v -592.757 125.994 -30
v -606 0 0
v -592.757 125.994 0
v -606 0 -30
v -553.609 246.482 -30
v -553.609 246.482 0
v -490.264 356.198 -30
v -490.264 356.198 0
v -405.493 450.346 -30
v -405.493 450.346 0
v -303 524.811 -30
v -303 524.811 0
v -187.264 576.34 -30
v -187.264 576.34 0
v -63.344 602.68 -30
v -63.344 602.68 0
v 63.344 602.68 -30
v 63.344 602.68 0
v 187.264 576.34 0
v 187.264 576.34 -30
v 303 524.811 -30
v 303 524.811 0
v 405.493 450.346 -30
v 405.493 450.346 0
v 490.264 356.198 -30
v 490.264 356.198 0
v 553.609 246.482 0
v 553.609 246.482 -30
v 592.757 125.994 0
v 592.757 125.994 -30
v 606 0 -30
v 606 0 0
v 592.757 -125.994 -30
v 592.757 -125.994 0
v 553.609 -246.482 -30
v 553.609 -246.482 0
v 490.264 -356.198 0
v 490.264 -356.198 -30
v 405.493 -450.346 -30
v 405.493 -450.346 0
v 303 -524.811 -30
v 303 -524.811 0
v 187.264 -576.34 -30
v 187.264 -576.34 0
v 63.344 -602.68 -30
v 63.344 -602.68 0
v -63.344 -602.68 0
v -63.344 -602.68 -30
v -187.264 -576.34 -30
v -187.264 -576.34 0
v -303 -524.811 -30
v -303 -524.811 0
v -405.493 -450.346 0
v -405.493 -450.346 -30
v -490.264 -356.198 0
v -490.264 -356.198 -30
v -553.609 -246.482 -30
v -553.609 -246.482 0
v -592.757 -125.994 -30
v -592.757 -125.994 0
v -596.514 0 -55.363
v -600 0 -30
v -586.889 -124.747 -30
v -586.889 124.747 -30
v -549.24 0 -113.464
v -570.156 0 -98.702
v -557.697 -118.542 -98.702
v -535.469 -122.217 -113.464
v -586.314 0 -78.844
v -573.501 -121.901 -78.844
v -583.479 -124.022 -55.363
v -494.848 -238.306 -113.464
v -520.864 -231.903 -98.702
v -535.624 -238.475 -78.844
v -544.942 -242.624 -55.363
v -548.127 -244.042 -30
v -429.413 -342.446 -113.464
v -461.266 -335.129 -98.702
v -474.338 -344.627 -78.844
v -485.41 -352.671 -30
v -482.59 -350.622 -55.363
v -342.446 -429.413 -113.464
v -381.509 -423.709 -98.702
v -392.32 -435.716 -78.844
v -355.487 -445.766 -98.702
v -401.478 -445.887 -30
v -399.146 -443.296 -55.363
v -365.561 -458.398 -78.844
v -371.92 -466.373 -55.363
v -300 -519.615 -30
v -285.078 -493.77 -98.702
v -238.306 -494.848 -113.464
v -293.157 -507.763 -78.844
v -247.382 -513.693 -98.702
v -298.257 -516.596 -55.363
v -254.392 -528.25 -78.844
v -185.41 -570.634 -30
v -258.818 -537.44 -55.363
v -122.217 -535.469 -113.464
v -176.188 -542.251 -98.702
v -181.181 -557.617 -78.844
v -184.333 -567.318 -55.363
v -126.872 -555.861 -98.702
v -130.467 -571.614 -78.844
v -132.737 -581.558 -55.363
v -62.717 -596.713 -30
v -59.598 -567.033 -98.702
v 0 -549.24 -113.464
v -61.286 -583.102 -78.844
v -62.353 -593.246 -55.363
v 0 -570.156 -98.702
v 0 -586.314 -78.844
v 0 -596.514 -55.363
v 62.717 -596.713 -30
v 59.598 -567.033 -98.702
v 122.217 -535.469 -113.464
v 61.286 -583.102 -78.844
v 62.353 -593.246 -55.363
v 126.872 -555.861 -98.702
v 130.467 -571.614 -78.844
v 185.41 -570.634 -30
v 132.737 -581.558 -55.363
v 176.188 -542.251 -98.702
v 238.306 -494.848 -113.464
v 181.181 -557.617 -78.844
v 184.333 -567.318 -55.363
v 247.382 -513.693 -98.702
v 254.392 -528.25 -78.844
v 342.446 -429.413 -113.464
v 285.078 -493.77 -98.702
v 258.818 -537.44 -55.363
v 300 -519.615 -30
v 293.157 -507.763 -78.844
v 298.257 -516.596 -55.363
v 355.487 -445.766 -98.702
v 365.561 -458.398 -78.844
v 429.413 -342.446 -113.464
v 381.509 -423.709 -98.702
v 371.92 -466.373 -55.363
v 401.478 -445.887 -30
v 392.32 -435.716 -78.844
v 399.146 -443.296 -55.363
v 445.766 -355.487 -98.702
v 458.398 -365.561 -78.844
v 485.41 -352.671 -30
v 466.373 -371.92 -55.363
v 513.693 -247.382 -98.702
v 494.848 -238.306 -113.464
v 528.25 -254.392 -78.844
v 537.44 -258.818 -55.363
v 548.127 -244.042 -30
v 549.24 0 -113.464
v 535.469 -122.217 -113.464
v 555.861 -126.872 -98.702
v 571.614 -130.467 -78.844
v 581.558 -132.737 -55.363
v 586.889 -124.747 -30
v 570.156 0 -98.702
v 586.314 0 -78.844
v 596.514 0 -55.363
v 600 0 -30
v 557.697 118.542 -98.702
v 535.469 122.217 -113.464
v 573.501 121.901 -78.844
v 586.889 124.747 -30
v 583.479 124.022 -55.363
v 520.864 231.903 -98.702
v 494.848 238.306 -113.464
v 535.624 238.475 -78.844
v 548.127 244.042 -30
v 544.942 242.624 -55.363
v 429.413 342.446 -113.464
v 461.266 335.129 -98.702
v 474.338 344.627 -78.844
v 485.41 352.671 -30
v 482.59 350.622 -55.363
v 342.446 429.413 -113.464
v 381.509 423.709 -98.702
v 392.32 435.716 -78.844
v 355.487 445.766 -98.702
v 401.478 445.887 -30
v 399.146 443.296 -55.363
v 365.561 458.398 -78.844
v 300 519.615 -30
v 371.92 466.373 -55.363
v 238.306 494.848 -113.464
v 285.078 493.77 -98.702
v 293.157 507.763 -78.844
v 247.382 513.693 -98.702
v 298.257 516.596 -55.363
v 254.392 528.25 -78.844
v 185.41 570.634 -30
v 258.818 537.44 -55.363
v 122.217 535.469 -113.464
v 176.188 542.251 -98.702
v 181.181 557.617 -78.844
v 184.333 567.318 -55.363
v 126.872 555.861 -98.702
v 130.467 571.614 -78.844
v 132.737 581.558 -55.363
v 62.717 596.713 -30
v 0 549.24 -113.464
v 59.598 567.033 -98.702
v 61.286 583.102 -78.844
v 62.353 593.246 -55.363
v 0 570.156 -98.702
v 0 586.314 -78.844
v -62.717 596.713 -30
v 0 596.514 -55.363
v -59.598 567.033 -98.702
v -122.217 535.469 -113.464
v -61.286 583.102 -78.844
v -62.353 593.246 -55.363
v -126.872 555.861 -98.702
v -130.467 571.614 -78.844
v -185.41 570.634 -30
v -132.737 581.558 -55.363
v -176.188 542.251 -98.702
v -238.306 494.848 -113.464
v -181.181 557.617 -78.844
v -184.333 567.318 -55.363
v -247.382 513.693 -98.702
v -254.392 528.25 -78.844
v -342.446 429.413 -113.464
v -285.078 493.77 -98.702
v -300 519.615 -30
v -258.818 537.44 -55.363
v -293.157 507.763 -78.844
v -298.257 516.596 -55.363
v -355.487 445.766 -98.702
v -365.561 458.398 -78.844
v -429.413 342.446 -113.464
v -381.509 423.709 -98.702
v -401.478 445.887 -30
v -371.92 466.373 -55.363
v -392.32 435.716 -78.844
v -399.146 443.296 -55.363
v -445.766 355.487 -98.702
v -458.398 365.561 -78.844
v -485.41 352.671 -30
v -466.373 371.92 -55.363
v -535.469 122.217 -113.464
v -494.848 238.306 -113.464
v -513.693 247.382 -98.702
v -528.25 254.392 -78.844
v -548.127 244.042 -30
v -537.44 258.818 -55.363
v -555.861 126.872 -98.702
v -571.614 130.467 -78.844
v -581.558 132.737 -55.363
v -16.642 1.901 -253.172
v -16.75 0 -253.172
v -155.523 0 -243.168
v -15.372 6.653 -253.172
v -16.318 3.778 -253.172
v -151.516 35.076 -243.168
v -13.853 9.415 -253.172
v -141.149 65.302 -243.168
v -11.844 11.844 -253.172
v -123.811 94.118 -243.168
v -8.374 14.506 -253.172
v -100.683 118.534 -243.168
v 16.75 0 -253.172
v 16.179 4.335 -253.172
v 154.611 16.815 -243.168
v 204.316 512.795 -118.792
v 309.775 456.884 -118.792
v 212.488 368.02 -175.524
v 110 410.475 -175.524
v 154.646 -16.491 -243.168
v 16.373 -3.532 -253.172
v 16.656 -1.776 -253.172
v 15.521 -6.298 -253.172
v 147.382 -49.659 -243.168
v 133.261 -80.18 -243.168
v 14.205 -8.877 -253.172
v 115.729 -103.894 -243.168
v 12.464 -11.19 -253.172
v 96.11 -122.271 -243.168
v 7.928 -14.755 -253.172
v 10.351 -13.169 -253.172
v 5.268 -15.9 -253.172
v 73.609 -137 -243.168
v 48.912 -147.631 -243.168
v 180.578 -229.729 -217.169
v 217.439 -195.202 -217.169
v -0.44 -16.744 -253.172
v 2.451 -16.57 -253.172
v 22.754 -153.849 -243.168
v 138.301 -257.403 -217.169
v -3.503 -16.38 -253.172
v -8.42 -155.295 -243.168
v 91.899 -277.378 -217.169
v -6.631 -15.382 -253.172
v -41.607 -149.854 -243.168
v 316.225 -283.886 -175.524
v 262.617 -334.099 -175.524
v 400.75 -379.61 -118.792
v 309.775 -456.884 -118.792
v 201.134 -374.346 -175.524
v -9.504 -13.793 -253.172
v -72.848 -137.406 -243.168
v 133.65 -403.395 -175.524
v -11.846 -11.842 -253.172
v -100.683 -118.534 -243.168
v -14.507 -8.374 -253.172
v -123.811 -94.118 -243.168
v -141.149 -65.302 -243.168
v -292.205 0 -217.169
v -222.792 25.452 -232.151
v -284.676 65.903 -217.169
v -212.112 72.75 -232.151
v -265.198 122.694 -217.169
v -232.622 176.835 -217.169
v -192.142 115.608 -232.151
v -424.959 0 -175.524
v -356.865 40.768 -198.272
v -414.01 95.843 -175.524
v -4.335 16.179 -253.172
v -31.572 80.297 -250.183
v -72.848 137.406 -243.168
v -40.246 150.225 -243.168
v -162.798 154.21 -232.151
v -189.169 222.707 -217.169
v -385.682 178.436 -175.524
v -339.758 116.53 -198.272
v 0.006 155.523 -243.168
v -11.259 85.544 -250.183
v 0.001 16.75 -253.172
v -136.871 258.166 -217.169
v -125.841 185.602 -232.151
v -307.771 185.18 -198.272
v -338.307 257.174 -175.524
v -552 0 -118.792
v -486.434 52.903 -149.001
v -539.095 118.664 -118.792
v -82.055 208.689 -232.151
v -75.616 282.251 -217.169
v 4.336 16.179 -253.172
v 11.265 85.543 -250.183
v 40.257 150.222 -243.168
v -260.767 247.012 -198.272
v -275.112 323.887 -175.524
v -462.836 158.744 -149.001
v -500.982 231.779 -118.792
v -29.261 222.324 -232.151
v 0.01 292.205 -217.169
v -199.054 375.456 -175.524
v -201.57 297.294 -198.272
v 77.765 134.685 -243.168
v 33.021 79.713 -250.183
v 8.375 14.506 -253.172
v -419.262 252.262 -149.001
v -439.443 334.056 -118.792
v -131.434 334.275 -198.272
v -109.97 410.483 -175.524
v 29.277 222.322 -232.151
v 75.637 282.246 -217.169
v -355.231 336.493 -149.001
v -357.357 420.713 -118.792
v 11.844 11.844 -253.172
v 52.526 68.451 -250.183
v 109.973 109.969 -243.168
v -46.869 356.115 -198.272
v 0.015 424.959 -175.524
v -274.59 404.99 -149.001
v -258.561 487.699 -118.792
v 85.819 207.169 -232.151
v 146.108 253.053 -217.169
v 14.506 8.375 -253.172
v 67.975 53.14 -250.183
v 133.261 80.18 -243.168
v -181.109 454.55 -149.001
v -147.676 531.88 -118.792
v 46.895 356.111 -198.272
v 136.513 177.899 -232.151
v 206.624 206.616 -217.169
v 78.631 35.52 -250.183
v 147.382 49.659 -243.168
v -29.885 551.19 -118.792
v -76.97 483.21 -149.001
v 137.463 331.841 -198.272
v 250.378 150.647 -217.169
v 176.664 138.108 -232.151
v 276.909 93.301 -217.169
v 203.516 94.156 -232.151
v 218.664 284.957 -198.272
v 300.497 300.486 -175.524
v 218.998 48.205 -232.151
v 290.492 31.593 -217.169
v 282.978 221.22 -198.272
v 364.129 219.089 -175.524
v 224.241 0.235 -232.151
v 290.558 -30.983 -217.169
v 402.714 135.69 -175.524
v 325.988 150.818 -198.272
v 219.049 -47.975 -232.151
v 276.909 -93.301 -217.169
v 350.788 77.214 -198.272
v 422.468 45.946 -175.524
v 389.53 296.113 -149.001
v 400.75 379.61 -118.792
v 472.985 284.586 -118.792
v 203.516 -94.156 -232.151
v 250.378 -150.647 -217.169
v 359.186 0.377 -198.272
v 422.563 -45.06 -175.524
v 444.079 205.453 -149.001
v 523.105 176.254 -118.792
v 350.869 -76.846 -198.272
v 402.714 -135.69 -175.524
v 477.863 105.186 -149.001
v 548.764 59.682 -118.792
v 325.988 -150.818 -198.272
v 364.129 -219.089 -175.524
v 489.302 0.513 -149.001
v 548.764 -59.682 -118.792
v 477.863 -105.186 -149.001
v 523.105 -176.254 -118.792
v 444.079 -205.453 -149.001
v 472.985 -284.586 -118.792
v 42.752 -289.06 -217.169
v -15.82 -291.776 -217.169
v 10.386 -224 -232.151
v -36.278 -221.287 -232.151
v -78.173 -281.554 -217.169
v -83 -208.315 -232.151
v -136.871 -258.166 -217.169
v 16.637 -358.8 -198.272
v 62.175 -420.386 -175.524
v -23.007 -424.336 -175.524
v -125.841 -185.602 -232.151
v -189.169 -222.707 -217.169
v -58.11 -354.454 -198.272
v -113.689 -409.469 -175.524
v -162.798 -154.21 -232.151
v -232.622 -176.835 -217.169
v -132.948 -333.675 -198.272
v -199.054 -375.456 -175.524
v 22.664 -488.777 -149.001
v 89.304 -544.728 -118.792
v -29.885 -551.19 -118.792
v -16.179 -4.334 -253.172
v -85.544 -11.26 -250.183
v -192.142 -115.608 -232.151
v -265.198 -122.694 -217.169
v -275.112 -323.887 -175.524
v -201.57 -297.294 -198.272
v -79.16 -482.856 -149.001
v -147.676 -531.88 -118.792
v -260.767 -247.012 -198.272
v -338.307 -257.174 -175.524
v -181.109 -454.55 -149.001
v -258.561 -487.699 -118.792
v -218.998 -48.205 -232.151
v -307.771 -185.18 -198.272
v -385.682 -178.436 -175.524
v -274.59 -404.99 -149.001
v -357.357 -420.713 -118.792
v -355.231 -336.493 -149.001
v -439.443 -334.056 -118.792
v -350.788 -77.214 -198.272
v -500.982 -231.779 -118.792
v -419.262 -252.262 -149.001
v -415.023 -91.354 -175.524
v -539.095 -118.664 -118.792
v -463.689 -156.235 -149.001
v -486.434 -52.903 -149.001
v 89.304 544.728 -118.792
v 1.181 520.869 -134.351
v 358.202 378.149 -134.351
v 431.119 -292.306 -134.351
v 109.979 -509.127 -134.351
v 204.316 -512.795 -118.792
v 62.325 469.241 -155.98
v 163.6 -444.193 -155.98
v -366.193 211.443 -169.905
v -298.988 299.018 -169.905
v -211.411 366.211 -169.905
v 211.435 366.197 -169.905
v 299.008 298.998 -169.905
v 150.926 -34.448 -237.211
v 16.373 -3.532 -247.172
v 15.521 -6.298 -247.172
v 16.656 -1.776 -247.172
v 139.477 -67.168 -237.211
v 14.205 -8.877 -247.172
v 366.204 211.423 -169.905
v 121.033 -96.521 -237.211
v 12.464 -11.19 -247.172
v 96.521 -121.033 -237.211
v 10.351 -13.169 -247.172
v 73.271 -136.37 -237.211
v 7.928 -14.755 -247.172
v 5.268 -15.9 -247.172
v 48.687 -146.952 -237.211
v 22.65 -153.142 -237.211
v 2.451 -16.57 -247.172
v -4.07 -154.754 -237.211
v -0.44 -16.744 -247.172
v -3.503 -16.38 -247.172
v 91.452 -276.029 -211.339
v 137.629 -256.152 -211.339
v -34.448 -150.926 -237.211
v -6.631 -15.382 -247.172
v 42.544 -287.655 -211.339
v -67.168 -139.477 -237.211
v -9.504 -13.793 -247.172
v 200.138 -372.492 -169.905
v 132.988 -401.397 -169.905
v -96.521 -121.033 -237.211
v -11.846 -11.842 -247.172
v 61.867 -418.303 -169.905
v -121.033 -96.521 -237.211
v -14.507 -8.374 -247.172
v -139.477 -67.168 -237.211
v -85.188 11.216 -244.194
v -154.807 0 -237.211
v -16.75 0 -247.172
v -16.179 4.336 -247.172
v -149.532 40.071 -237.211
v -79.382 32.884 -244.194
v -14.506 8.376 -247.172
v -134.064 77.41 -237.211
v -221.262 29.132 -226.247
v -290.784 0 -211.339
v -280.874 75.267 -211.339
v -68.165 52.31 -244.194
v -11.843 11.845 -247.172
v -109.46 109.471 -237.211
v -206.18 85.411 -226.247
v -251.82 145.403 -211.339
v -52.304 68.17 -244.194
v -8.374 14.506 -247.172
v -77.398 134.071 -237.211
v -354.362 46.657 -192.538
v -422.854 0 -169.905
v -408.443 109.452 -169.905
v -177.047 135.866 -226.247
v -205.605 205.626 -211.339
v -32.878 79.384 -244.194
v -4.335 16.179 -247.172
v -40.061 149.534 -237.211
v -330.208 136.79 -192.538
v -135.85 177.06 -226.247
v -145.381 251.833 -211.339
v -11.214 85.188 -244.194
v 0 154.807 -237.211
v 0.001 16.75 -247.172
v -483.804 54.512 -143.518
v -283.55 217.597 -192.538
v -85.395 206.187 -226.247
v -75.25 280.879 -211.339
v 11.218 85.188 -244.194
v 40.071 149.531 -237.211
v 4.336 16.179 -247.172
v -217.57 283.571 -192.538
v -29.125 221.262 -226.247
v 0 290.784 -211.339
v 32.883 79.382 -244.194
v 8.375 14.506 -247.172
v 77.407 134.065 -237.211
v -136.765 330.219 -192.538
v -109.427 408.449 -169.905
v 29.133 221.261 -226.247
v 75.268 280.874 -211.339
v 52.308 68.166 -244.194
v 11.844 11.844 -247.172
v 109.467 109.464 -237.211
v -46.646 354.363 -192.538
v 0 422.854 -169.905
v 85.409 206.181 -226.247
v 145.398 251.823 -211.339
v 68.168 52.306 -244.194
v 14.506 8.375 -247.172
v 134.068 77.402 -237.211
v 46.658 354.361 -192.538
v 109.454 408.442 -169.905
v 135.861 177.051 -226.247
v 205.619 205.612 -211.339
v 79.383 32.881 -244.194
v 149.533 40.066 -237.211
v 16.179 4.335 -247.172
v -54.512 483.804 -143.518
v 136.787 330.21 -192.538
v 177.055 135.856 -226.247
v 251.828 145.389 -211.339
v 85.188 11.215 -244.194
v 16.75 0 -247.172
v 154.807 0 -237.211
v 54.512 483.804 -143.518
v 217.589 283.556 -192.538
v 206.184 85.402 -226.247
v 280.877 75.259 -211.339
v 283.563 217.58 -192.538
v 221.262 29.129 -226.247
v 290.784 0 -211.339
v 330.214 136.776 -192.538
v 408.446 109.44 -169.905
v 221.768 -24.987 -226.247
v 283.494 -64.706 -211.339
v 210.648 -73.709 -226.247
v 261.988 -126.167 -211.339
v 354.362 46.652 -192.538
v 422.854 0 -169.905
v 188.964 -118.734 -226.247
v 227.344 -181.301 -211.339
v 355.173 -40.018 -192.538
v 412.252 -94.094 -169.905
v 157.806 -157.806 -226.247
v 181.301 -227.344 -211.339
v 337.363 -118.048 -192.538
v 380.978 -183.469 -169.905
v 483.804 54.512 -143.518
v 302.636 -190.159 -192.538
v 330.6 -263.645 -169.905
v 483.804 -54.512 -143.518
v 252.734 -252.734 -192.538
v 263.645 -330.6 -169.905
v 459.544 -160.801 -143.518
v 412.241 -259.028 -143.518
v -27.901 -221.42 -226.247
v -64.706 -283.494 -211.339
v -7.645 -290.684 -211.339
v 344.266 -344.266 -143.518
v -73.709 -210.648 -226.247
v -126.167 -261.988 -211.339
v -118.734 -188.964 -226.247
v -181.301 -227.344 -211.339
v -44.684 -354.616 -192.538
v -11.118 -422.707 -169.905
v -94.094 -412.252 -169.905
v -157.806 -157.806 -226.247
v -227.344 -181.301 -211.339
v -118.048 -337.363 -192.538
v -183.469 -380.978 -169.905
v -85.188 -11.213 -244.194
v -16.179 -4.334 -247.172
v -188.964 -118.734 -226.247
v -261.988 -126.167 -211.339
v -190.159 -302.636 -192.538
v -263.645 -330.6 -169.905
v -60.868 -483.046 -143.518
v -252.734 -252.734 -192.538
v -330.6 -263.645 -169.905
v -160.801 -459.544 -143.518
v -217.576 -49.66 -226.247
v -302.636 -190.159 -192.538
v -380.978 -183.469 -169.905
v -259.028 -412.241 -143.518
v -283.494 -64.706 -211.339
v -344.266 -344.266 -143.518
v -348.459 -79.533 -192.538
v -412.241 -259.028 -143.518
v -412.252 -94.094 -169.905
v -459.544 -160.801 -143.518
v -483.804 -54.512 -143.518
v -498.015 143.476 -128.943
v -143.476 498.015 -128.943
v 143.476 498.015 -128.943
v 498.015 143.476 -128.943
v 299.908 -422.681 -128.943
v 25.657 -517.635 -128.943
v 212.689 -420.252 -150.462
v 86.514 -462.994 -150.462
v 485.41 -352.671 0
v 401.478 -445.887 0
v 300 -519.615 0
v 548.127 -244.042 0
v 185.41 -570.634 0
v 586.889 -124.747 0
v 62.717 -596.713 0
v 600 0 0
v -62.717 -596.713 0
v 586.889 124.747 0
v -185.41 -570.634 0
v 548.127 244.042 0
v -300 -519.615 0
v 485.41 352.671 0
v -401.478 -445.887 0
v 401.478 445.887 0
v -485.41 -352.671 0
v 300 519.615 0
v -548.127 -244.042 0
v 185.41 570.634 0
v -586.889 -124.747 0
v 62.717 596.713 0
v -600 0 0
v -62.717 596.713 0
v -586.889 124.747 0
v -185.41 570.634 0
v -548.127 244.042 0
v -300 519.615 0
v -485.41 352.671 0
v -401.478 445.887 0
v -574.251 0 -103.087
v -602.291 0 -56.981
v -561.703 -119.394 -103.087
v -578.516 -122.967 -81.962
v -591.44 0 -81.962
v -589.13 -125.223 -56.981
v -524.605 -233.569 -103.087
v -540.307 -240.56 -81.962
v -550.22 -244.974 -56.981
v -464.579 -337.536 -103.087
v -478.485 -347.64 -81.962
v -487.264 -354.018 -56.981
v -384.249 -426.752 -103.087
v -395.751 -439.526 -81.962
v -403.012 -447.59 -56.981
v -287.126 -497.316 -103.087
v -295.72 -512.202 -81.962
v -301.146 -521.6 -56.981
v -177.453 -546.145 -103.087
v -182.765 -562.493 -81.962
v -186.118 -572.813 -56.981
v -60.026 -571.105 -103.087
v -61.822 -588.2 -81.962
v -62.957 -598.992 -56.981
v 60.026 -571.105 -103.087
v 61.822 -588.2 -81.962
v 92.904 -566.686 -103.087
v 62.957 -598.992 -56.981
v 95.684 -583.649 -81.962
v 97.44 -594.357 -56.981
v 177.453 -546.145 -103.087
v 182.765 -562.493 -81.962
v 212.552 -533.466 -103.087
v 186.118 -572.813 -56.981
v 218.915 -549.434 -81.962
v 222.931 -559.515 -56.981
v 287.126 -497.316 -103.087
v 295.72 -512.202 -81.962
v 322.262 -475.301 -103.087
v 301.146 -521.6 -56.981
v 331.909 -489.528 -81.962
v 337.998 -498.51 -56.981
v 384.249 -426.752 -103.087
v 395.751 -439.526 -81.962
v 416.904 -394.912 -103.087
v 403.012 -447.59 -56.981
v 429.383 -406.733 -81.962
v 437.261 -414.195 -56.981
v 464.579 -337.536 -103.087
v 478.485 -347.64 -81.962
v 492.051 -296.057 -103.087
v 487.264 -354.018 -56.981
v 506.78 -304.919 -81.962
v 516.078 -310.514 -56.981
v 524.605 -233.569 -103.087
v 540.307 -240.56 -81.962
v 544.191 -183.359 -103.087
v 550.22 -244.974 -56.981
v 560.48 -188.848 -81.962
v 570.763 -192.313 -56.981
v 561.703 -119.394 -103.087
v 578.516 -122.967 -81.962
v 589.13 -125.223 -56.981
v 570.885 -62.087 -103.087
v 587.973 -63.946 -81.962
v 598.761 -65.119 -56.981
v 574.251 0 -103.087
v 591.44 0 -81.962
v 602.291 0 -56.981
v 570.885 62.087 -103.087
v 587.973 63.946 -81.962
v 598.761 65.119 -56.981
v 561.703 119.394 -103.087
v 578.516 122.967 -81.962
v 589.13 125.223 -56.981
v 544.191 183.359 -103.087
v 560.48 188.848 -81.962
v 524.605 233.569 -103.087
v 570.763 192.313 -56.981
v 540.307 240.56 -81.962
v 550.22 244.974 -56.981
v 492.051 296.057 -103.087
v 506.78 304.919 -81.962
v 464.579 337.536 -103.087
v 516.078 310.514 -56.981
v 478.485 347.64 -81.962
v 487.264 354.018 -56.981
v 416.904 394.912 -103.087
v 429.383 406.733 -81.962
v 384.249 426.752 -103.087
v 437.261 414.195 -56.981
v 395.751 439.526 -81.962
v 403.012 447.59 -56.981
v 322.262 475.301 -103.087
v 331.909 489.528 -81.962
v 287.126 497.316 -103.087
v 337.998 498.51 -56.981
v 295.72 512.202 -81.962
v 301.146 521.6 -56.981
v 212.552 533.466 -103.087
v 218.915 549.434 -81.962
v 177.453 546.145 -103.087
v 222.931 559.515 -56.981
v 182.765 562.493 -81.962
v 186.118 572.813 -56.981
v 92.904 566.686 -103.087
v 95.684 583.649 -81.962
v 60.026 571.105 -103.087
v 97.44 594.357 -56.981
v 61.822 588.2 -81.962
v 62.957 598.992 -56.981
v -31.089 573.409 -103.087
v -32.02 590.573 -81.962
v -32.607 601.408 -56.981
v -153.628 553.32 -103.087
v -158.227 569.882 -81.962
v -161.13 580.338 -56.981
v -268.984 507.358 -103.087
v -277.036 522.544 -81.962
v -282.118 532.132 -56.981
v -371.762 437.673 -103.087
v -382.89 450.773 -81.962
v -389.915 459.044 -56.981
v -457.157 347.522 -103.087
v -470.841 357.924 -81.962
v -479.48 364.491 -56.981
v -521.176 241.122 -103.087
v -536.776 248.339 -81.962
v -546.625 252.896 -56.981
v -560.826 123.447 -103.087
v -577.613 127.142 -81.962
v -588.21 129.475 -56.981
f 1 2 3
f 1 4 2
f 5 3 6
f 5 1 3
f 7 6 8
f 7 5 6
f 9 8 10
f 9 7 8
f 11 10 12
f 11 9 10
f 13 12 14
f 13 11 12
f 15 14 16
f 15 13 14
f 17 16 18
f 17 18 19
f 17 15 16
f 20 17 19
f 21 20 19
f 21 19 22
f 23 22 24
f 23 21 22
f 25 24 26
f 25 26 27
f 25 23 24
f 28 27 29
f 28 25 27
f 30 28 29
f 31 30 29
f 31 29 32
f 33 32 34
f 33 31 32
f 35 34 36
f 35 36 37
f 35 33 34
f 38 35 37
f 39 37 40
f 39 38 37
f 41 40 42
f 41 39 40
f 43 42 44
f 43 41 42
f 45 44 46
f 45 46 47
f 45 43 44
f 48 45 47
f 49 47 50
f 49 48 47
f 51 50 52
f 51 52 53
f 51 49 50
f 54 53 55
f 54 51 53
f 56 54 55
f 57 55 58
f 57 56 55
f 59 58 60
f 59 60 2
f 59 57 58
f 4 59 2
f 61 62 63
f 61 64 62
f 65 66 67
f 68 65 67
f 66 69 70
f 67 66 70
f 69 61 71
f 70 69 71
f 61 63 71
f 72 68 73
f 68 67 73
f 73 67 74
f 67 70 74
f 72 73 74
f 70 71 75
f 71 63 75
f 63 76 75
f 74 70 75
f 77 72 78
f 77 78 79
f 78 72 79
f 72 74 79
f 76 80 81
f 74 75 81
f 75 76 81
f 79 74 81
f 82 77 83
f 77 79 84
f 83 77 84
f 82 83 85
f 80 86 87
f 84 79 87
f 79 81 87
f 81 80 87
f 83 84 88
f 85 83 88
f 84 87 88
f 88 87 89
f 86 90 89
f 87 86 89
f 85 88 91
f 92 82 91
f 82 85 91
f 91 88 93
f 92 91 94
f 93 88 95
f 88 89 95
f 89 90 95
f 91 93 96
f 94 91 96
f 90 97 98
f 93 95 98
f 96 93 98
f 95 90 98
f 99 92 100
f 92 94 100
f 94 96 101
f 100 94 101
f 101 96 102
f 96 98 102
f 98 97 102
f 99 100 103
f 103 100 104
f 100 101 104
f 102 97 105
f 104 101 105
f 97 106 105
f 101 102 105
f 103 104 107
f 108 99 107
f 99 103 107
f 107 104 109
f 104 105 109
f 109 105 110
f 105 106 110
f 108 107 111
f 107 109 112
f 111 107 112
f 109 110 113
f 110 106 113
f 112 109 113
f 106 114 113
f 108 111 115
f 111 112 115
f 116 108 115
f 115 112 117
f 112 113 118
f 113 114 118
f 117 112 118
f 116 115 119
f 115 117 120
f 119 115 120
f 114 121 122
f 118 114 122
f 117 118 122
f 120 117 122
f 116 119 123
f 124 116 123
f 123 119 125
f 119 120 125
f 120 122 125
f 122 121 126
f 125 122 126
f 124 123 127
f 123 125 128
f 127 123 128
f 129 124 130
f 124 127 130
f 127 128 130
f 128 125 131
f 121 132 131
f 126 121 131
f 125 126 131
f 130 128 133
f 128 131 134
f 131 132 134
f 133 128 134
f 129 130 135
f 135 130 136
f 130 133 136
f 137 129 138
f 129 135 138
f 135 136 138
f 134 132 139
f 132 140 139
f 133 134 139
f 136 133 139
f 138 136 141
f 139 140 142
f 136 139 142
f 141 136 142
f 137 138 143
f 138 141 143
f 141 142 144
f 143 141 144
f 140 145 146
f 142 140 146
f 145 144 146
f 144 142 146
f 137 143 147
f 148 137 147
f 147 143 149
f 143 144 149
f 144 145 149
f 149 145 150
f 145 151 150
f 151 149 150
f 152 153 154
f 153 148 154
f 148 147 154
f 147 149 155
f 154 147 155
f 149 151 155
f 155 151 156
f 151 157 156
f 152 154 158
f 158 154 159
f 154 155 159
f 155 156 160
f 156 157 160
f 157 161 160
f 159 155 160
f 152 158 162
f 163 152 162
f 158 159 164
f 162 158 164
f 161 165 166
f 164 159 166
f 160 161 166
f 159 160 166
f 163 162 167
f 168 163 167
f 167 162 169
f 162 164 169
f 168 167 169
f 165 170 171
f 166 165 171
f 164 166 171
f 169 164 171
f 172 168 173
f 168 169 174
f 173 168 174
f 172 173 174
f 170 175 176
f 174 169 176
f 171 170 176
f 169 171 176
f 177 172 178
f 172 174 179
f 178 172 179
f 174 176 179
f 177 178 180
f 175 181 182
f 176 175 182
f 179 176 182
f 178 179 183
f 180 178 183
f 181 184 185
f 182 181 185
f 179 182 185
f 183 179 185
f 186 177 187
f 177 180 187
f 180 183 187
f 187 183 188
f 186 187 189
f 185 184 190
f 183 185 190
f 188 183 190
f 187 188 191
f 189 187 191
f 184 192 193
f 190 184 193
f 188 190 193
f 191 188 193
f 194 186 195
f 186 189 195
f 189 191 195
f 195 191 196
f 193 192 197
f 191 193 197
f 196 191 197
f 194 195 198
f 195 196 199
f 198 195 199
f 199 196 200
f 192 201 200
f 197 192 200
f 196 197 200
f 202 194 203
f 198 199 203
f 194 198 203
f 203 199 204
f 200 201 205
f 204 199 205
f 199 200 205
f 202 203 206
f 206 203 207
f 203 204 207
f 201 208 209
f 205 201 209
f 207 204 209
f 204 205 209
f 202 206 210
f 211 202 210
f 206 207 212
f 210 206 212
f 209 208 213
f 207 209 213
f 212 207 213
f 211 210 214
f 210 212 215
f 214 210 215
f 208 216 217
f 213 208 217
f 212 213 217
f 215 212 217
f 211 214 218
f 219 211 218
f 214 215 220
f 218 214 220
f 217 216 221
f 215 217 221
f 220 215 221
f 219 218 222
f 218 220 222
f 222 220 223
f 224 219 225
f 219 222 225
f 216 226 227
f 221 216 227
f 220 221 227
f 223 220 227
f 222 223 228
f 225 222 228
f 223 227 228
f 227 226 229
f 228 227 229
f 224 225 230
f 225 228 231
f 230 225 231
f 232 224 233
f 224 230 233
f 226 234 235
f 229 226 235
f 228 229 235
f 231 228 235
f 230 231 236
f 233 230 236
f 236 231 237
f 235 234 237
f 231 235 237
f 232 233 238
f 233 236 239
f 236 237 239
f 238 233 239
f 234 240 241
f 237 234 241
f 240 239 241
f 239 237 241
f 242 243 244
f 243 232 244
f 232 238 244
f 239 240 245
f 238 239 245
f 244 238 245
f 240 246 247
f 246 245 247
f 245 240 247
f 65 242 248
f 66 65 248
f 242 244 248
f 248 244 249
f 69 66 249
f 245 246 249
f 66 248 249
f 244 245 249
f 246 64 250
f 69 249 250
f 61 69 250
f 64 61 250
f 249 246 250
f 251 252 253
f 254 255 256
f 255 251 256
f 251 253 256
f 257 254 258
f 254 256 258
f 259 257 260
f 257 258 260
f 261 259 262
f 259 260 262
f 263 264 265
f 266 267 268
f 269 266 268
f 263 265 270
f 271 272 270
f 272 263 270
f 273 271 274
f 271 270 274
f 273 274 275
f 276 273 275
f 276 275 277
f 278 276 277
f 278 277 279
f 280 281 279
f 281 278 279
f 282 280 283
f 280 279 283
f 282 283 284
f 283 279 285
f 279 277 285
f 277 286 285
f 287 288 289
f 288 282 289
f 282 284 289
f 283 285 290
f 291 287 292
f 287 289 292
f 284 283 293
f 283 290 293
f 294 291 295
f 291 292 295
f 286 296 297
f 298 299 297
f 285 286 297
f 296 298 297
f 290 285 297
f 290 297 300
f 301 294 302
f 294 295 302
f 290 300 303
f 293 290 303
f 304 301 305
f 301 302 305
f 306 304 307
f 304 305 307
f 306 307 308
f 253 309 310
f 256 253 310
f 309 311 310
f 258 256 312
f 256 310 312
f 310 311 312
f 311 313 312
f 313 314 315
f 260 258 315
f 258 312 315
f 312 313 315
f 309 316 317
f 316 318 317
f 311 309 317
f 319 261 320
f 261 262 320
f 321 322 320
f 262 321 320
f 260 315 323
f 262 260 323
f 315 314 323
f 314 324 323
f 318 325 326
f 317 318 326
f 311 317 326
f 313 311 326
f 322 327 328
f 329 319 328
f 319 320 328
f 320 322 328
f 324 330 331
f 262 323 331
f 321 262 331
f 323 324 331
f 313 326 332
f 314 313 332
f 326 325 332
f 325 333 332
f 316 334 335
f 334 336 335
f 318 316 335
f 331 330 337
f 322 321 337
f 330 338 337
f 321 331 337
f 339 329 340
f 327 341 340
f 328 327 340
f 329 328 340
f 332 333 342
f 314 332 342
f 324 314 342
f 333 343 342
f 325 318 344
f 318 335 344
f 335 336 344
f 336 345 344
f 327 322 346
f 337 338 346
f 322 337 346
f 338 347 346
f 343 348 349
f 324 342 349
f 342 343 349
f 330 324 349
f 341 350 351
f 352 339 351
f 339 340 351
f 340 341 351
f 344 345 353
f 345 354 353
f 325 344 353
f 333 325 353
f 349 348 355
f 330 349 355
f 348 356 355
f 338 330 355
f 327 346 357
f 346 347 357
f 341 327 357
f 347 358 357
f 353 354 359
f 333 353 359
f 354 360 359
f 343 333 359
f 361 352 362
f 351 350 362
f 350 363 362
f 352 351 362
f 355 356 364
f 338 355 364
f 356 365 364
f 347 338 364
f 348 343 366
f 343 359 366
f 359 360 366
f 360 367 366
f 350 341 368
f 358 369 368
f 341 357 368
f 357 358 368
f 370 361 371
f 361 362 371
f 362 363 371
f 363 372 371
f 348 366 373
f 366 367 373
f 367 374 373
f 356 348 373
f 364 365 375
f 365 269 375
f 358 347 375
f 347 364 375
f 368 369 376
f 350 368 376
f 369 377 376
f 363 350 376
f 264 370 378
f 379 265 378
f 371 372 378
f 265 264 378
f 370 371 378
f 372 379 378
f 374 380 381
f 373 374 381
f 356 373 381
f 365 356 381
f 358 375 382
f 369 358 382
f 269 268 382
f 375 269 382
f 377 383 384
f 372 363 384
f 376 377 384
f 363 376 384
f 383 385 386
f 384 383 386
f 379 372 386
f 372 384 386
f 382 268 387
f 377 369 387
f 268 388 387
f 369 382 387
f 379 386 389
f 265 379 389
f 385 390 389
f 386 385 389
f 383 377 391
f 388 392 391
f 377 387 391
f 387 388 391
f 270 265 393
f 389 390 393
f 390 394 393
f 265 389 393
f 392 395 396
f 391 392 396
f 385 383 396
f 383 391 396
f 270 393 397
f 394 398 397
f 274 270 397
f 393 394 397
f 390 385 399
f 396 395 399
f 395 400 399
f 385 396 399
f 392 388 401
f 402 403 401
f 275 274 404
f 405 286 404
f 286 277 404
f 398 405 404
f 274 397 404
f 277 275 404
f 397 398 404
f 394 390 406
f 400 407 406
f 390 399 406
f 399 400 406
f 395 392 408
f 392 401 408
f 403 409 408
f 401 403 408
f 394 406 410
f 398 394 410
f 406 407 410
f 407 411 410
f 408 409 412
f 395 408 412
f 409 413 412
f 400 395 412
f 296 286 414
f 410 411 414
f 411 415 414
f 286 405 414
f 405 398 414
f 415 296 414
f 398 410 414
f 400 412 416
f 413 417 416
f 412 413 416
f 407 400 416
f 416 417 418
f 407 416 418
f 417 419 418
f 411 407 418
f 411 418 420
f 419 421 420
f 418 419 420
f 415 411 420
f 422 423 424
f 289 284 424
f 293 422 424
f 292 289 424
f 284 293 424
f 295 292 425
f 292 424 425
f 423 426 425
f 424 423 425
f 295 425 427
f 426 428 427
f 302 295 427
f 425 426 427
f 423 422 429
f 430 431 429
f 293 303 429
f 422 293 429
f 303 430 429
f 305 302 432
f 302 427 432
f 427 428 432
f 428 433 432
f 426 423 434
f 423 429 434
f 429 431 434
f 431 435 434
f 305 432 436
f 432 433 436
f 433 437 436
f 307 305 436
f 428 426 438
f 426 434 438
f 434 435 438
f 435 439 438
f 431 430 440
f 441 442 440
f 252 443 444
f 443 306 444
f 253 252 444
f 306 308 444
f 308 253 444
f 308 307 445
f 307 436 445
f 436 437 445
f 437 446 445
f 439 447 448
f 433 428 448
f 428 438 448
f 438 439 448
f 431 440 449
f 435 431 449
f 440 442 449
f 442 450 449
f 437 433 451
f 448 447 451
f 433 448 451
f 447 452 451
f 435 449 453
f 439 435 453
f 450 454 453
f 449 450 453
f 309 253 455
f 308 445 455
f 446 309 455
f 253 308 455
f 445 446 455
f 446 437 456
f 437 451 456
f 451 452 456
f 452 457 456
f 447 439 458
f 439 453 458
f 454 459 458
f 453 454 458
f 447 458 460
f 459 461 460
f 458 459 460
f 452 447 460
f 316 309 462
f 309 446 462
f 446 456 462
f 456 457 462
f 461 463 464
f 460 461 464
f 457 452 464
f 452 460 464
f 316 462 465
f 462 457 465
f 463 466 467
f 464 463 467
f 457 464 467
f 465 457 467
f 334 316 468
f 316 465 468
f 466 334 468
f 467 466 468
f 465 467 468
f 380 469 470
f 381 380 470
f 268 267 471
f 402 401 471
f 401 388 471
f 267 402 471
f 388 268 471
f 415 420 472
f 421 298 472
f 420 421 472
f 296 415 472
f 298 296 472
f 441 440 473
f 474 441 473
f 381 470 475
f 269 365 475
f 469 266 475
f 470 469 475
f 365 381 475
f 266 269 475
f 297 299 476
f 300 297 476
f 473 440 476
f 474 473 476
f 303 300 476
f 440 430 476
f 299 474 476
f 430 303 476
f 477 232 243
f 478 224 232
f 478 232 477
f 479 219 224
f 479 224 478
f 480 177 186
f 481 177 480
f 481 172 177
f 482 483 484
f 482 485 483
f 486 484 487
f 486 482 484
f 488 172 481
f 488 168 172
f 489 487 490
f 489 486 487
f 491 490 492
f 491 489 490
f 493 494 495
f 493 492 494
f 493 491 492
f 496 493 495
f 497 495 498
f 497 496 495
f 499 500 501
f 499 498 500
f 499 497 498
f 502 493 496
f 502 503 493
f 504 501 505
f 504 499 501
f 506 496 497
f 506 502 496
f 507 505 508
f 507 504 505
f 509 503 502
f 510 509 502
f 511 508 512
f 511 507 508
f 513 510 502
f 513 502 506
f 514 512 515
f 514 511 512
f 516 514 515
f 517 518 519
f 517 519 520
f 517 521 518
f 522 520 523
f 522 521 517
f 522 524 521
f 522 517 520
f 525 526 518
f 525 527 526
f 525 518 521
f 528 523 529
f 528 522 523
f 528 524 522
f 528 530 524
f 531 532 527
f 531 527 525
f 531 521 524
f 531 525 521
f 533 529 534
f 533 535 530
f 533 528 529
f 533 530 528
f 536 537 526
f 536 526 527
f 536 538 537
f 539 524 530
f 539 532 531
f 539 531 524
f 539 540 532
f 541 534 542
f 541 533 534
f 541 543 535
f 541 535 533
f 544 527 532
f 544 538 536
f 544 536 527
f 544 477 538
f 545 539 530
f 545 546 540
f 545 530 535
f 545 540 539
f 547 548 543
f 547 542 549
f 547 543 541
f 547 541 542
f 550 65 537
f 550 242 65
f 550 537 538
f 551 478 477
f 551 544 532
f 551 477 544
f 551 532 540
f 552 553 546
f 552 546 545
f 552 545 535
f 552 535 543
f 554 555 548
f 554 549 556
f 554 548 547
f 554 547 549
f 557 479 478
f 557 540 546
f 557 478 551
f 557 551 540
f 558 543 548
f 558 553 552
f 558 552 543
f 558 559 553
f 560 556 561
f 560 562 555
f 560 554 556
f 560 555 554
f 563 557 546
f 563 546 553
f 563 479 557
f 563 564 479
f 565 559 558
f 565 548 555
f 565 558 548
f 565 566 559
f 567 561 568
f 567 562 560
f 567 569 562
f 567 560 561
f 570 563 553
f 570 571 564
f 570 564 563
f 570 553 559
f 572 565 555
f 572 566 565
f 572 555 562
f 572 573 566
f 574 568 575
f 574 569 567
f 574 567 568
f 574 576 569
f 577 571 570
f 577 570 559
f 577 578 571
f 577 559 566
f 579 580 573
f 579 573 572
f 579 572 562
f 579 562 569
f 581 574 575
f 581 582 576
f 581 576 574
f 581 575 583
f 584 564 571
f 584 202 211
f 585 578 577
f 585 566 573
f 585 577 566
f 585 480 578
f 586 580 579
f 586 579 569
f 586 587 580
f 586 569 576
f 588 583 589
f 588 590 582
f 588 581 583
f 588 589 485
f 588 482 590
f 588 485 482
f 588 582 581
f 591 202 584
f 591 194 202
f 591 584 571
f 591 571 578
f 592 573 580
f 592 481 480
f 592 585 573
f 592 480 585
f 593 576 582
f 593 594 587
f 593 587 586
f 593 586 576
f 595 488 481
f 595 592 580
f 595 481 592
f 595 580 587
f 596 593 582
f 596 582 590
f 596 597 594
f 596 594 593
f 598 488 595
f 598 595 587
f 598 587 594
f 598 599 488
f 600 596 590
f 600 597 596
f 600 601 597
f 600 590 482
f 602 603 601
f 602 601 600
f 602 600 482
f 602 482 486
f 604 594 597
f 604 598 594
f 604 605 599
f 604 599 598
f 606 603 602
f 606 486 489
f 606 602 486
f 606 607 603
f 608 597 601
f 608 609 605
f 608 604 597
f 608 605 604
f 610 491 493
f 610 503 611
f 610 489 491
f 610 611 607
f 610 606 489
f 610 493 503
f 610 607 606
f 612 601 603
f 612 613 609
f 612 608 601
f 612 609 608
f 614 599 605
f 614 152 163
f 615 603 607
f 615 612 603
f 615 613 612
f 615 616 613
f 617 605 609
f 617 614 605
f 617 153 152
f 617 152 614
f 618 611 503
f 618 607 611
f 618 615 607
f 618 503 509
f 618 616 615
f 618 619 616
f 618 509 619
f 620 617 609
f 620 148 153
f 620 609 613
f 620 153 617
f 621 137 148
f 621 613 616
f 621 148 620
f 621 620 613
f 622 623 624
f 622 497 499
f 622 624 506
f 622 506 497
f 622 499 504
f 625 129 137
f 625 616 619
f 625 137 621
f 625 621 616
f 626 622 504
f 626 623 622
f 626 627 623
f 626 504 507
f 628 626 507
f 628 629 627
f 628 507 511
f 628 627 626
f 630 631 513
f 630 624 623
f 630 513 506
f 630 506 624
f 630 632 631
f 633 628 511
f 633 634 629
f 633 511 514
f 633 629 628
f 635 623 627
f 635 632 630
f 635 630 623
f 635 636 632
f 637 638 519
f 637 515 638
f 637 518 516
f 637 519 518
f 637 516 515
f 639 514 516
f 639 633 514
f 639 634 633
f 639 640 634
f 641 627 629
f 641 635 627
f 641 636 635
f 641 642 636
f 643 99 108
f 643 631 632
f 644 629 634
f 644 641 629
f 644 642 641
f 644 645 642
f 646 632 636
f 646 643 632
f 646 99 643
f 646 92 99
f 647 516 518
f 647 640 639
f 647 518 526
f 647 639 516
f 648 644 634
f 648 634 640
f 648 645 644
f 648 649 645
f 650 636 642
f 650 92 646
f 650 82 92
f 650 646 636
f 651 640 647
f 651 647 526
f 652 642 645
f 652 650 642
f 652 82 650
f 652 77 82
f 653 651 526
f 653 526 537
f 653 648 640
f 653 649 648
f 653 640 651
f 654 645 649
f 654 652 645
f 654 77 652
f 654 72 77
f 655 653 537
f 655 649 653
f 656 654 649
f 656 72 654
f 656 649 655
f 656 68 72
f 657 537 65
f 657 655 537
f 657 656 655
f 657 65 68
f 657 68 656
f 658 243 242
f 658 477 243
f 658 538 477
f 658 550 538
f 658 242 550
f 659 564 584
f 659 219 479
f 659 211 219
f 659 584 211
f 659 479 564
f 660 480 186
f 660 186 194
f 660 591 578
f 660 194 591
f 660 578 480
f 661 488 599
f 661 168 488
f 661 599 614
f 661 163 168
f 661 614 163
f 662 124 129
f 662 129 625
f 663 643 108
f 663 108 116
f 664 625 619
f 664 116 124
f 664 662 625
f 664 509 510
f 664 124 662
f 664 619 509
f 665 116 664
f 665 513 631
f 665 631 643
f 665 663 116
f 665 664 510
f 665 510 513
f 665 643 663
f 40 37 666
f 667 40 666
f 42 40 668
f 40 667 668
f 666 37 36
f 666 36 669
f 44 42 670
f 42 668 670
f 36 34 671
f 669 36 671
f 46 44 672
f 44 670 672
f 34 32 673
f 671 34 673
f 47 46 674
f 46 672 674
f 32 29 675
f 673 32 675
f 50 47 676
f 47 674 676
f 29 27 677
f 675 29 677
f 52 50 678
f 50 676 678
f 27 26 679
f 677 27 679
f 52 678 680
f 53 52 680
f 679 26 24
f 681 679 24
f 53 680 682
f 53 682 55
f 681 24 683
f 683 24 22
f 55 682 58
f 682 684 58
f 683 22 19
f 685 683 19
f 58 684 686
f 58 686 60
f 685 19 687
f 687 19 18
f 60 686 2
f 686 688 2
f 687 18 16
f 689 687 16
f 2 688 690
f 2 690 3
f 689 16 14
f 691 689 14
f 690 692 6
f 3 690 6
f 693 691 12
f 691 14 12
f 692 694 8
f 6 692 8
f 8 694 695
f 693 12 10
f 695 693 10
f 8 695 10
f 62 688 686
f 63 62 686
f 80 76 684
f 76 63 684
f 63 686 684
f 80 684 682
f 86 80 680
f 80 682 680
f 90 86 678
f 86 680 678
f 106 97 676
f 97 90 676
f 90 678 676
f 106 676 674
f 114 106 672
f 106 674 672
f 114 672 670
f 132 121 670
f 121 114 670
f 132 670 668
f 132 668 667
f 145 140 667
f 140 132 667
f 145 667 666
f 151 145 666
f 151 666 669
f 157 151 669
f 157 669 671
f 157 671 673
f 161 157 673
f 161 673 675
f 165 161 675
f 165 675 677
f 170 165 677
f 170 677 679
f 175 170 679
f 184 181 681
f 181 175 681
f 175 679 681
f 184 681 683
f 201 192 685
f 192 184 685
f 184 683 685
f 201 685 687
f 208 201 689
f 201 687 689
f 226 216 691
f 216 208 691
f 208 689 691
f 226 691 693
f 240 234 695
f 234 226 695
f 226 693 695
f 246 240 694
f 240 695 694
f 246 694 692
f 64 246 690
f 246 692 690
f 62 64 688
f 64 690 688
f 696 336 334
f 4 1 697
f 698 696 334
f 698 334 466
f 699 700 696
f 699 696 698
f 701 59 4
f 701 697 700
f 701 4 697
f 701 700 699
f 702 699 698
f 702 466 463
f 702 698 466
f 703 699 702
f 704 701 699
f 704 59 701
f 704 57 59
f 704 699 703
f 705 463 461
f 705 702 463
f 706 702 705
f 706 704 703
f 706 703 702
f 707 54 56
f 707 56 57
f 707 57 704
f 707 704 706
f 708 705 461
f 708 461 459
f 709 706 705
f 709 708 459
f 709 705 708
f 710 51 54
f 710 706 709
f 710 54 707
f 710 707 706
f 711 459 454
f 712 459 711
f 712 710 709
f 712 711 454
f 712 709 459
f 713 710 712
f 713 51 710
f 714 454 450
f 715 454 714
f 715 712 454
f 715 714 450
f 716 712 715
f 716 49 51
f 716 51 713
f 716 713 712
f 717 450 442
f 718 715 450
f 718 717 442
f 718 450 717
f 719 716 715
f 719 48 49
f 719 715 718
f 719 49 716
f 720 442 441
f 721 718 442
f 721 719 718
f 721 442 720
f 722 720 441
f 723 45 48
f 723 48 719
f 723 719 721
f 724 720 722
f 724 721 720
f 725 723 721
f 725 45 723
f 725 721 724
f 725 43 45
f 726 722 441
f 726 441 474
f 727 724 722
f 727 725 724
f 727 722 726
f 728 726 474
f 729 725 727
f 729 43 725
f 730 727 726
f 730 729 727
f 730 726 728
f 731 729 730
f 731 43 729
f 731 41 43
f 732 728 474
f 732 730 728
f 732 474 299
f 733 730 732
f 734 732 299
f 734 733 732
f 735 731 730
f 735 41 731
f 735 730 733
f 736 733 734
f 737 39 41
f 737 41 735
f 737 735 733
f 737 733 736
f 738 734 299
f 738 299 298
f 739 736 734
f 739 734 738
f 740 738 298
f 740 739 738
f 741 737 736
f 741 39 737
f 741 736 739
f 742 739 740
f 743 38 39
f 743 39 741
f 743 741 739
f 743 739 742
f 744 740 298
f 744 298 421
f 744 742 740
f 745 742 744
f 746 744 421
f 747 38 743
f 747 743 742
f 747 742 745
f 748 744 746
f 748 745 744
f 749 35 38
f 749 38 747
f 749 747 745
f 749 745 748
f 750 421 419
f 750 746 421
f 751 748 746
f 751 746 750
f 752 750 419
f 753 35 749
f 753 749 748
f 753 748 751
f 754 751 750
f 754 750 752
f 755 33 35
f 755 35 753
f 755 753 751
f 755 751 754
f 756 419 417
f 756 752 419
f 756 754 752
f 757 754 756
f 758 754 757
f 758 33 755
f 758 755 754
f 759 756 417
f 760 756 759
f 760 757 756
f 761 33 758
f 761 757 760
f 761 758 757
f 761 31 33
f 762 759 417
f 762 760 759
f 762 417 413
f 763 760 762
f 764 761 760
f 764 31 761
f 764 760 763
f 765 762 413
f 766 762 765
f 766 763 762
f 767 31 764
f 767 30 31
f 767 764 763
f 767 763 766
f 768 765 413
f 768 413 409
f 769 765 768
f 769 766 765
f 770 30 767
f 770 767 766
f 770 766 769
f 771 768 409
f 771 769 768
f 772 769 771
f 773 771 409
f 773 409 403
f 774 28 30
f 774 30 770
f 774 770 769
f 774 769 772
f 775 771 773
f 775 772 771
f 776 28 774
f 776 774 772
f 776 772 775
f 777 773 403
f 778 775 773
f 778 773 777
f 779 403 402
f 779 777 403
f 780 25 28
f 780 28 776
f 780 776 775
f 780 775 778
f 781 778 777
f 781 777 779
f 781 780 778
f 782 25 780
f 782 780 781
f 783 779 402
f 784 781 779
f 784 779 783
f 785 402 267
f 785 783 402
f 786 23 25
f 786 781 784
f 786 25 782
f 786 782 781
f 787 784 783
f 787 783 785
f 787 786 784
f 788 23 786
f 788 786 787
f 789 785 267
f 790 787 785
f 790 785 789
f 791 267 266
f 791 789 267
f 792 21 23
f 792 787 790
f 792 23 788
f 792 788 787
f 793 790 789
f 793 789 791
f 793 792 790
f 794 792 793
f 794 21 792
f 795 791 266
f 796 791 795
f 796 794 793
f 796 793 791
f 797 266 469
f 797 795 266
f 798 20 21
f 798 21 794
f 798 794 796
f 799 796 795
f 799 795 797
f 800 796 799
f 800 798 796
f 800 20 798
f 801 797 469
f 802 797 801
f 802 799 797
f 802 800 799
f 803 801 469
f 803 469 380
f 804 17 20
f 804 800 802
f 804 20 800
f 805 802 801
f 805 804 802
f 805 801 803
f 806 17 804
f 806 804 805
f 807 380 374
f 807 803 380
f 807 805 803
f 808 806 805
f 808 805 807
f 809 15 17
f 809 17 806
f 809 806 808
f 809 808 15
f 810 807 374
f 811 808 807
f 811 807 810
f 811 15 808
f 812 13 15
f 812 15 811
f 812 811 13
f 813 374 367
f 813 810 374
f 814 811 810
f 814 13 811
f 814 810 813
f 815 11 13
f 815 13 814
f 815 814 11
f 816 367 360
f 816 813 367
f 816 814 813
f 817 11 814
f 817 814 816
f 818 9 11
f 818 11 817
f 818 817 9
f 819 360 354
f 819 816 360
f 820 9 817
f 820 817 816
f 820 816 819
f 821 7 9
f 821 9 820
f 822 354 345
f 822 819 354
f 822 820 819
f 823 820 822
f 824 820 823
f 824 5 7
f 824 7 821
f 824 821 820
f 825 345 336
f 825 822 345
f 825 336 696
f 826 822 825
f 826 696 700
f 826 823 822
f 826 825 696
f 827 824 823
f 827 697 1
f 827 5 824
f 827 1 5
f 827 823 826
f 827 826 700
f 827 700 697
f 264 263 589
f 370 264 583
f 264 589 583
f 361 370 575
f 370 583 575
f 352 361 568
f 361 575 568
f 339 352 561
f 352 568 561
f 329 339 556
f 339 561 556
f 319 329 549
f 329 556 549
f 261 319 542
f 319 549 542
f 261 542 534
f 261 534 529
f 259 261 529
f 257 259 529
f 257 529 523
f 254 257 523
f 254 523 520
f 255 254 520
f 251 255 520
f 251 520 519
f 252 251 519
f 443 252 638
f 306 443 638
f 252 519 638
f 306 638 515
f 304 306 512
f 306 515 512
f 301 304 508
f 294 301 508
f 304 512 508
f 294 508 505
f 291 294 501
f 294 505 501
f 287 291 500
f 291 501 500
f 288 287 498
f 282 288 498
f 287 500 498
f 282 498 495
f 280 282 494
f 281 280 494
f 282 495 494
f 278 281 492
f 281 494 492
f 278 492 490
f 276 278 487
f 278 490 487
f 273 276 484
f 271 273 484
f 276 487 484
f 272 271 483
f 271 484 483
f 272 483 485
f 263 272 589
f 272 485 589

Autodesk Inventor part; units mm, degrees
ref_plane "YZ Plane" through (0, 0, 0) normal (1, 0, 0) x (0, 1, 0)
ref_plane "XZ Plane" through (0, 0, 0) normal (0, 1, 0) x (-1, 0, 0)
ref_plane "XY Plane" through (0, 0, 0) normal (0, 0, 1) x (1, 0, 0)
sketch "Sketch1" plane through (0, 0, 0) normal (0, 1, 0) x (-1, 0, 0)
  line L0 (606, 0) -> (606, -30)
  arc A0 (552, -118.7919) -> (606, -30) centre (506, -30) ccw
  arc A1 (0, -253.2892) -> (552, -118.7919) centre (0, 946.7108) ccw
  line L1 (0, 191.6842) -> (0, -191.6842)
  arc A2 (0, -247.2892) -> (549.24, -113.4644) centre (0, 946.7108) ccw
  arc A3 (549.24, -113.4644) -> (600, -30) centre (506, -30) ccw
  line L2 (600, -30) -> (600, 0)
  line L3 (600, 0) -> (606, 0)
  line L4 (0, -247.2892) -> (0, -253.2892)
  point P0 (0, 0)
  point P1 (0, 0)
  point P2 (0, -250.2892)
  point P3 (0, -163.7009)
  point P4 (0, -169.7009)
  dimension "d0" = 100
  dimension "d1" = 30
  dimension "d3" = 1200
  dimension "d6" = 6
  dimension "d11" = 1200
  dimension "d12" = 253.2892
revolve "Revolution1" add sketch "Sketch1" angle 360 about axis through (0, 0, 191.6842) along (0, 0, -1)
sketch "Sketch2" plane through (0, 0, 0) normal (0, 0, 1) x (1, 0, 0)
  circle A0 centre (0, 0) radius 16.75
  dimension "d8" = 33.5
extrude "Extrusion1" cut sketch "Sketch2" against normal through all
equation "\"d3\" = d11"
equation "\"Disherd_head_hight\" = d12"
properties part number "PNV - 704 dished head D1200" material "Steel"
